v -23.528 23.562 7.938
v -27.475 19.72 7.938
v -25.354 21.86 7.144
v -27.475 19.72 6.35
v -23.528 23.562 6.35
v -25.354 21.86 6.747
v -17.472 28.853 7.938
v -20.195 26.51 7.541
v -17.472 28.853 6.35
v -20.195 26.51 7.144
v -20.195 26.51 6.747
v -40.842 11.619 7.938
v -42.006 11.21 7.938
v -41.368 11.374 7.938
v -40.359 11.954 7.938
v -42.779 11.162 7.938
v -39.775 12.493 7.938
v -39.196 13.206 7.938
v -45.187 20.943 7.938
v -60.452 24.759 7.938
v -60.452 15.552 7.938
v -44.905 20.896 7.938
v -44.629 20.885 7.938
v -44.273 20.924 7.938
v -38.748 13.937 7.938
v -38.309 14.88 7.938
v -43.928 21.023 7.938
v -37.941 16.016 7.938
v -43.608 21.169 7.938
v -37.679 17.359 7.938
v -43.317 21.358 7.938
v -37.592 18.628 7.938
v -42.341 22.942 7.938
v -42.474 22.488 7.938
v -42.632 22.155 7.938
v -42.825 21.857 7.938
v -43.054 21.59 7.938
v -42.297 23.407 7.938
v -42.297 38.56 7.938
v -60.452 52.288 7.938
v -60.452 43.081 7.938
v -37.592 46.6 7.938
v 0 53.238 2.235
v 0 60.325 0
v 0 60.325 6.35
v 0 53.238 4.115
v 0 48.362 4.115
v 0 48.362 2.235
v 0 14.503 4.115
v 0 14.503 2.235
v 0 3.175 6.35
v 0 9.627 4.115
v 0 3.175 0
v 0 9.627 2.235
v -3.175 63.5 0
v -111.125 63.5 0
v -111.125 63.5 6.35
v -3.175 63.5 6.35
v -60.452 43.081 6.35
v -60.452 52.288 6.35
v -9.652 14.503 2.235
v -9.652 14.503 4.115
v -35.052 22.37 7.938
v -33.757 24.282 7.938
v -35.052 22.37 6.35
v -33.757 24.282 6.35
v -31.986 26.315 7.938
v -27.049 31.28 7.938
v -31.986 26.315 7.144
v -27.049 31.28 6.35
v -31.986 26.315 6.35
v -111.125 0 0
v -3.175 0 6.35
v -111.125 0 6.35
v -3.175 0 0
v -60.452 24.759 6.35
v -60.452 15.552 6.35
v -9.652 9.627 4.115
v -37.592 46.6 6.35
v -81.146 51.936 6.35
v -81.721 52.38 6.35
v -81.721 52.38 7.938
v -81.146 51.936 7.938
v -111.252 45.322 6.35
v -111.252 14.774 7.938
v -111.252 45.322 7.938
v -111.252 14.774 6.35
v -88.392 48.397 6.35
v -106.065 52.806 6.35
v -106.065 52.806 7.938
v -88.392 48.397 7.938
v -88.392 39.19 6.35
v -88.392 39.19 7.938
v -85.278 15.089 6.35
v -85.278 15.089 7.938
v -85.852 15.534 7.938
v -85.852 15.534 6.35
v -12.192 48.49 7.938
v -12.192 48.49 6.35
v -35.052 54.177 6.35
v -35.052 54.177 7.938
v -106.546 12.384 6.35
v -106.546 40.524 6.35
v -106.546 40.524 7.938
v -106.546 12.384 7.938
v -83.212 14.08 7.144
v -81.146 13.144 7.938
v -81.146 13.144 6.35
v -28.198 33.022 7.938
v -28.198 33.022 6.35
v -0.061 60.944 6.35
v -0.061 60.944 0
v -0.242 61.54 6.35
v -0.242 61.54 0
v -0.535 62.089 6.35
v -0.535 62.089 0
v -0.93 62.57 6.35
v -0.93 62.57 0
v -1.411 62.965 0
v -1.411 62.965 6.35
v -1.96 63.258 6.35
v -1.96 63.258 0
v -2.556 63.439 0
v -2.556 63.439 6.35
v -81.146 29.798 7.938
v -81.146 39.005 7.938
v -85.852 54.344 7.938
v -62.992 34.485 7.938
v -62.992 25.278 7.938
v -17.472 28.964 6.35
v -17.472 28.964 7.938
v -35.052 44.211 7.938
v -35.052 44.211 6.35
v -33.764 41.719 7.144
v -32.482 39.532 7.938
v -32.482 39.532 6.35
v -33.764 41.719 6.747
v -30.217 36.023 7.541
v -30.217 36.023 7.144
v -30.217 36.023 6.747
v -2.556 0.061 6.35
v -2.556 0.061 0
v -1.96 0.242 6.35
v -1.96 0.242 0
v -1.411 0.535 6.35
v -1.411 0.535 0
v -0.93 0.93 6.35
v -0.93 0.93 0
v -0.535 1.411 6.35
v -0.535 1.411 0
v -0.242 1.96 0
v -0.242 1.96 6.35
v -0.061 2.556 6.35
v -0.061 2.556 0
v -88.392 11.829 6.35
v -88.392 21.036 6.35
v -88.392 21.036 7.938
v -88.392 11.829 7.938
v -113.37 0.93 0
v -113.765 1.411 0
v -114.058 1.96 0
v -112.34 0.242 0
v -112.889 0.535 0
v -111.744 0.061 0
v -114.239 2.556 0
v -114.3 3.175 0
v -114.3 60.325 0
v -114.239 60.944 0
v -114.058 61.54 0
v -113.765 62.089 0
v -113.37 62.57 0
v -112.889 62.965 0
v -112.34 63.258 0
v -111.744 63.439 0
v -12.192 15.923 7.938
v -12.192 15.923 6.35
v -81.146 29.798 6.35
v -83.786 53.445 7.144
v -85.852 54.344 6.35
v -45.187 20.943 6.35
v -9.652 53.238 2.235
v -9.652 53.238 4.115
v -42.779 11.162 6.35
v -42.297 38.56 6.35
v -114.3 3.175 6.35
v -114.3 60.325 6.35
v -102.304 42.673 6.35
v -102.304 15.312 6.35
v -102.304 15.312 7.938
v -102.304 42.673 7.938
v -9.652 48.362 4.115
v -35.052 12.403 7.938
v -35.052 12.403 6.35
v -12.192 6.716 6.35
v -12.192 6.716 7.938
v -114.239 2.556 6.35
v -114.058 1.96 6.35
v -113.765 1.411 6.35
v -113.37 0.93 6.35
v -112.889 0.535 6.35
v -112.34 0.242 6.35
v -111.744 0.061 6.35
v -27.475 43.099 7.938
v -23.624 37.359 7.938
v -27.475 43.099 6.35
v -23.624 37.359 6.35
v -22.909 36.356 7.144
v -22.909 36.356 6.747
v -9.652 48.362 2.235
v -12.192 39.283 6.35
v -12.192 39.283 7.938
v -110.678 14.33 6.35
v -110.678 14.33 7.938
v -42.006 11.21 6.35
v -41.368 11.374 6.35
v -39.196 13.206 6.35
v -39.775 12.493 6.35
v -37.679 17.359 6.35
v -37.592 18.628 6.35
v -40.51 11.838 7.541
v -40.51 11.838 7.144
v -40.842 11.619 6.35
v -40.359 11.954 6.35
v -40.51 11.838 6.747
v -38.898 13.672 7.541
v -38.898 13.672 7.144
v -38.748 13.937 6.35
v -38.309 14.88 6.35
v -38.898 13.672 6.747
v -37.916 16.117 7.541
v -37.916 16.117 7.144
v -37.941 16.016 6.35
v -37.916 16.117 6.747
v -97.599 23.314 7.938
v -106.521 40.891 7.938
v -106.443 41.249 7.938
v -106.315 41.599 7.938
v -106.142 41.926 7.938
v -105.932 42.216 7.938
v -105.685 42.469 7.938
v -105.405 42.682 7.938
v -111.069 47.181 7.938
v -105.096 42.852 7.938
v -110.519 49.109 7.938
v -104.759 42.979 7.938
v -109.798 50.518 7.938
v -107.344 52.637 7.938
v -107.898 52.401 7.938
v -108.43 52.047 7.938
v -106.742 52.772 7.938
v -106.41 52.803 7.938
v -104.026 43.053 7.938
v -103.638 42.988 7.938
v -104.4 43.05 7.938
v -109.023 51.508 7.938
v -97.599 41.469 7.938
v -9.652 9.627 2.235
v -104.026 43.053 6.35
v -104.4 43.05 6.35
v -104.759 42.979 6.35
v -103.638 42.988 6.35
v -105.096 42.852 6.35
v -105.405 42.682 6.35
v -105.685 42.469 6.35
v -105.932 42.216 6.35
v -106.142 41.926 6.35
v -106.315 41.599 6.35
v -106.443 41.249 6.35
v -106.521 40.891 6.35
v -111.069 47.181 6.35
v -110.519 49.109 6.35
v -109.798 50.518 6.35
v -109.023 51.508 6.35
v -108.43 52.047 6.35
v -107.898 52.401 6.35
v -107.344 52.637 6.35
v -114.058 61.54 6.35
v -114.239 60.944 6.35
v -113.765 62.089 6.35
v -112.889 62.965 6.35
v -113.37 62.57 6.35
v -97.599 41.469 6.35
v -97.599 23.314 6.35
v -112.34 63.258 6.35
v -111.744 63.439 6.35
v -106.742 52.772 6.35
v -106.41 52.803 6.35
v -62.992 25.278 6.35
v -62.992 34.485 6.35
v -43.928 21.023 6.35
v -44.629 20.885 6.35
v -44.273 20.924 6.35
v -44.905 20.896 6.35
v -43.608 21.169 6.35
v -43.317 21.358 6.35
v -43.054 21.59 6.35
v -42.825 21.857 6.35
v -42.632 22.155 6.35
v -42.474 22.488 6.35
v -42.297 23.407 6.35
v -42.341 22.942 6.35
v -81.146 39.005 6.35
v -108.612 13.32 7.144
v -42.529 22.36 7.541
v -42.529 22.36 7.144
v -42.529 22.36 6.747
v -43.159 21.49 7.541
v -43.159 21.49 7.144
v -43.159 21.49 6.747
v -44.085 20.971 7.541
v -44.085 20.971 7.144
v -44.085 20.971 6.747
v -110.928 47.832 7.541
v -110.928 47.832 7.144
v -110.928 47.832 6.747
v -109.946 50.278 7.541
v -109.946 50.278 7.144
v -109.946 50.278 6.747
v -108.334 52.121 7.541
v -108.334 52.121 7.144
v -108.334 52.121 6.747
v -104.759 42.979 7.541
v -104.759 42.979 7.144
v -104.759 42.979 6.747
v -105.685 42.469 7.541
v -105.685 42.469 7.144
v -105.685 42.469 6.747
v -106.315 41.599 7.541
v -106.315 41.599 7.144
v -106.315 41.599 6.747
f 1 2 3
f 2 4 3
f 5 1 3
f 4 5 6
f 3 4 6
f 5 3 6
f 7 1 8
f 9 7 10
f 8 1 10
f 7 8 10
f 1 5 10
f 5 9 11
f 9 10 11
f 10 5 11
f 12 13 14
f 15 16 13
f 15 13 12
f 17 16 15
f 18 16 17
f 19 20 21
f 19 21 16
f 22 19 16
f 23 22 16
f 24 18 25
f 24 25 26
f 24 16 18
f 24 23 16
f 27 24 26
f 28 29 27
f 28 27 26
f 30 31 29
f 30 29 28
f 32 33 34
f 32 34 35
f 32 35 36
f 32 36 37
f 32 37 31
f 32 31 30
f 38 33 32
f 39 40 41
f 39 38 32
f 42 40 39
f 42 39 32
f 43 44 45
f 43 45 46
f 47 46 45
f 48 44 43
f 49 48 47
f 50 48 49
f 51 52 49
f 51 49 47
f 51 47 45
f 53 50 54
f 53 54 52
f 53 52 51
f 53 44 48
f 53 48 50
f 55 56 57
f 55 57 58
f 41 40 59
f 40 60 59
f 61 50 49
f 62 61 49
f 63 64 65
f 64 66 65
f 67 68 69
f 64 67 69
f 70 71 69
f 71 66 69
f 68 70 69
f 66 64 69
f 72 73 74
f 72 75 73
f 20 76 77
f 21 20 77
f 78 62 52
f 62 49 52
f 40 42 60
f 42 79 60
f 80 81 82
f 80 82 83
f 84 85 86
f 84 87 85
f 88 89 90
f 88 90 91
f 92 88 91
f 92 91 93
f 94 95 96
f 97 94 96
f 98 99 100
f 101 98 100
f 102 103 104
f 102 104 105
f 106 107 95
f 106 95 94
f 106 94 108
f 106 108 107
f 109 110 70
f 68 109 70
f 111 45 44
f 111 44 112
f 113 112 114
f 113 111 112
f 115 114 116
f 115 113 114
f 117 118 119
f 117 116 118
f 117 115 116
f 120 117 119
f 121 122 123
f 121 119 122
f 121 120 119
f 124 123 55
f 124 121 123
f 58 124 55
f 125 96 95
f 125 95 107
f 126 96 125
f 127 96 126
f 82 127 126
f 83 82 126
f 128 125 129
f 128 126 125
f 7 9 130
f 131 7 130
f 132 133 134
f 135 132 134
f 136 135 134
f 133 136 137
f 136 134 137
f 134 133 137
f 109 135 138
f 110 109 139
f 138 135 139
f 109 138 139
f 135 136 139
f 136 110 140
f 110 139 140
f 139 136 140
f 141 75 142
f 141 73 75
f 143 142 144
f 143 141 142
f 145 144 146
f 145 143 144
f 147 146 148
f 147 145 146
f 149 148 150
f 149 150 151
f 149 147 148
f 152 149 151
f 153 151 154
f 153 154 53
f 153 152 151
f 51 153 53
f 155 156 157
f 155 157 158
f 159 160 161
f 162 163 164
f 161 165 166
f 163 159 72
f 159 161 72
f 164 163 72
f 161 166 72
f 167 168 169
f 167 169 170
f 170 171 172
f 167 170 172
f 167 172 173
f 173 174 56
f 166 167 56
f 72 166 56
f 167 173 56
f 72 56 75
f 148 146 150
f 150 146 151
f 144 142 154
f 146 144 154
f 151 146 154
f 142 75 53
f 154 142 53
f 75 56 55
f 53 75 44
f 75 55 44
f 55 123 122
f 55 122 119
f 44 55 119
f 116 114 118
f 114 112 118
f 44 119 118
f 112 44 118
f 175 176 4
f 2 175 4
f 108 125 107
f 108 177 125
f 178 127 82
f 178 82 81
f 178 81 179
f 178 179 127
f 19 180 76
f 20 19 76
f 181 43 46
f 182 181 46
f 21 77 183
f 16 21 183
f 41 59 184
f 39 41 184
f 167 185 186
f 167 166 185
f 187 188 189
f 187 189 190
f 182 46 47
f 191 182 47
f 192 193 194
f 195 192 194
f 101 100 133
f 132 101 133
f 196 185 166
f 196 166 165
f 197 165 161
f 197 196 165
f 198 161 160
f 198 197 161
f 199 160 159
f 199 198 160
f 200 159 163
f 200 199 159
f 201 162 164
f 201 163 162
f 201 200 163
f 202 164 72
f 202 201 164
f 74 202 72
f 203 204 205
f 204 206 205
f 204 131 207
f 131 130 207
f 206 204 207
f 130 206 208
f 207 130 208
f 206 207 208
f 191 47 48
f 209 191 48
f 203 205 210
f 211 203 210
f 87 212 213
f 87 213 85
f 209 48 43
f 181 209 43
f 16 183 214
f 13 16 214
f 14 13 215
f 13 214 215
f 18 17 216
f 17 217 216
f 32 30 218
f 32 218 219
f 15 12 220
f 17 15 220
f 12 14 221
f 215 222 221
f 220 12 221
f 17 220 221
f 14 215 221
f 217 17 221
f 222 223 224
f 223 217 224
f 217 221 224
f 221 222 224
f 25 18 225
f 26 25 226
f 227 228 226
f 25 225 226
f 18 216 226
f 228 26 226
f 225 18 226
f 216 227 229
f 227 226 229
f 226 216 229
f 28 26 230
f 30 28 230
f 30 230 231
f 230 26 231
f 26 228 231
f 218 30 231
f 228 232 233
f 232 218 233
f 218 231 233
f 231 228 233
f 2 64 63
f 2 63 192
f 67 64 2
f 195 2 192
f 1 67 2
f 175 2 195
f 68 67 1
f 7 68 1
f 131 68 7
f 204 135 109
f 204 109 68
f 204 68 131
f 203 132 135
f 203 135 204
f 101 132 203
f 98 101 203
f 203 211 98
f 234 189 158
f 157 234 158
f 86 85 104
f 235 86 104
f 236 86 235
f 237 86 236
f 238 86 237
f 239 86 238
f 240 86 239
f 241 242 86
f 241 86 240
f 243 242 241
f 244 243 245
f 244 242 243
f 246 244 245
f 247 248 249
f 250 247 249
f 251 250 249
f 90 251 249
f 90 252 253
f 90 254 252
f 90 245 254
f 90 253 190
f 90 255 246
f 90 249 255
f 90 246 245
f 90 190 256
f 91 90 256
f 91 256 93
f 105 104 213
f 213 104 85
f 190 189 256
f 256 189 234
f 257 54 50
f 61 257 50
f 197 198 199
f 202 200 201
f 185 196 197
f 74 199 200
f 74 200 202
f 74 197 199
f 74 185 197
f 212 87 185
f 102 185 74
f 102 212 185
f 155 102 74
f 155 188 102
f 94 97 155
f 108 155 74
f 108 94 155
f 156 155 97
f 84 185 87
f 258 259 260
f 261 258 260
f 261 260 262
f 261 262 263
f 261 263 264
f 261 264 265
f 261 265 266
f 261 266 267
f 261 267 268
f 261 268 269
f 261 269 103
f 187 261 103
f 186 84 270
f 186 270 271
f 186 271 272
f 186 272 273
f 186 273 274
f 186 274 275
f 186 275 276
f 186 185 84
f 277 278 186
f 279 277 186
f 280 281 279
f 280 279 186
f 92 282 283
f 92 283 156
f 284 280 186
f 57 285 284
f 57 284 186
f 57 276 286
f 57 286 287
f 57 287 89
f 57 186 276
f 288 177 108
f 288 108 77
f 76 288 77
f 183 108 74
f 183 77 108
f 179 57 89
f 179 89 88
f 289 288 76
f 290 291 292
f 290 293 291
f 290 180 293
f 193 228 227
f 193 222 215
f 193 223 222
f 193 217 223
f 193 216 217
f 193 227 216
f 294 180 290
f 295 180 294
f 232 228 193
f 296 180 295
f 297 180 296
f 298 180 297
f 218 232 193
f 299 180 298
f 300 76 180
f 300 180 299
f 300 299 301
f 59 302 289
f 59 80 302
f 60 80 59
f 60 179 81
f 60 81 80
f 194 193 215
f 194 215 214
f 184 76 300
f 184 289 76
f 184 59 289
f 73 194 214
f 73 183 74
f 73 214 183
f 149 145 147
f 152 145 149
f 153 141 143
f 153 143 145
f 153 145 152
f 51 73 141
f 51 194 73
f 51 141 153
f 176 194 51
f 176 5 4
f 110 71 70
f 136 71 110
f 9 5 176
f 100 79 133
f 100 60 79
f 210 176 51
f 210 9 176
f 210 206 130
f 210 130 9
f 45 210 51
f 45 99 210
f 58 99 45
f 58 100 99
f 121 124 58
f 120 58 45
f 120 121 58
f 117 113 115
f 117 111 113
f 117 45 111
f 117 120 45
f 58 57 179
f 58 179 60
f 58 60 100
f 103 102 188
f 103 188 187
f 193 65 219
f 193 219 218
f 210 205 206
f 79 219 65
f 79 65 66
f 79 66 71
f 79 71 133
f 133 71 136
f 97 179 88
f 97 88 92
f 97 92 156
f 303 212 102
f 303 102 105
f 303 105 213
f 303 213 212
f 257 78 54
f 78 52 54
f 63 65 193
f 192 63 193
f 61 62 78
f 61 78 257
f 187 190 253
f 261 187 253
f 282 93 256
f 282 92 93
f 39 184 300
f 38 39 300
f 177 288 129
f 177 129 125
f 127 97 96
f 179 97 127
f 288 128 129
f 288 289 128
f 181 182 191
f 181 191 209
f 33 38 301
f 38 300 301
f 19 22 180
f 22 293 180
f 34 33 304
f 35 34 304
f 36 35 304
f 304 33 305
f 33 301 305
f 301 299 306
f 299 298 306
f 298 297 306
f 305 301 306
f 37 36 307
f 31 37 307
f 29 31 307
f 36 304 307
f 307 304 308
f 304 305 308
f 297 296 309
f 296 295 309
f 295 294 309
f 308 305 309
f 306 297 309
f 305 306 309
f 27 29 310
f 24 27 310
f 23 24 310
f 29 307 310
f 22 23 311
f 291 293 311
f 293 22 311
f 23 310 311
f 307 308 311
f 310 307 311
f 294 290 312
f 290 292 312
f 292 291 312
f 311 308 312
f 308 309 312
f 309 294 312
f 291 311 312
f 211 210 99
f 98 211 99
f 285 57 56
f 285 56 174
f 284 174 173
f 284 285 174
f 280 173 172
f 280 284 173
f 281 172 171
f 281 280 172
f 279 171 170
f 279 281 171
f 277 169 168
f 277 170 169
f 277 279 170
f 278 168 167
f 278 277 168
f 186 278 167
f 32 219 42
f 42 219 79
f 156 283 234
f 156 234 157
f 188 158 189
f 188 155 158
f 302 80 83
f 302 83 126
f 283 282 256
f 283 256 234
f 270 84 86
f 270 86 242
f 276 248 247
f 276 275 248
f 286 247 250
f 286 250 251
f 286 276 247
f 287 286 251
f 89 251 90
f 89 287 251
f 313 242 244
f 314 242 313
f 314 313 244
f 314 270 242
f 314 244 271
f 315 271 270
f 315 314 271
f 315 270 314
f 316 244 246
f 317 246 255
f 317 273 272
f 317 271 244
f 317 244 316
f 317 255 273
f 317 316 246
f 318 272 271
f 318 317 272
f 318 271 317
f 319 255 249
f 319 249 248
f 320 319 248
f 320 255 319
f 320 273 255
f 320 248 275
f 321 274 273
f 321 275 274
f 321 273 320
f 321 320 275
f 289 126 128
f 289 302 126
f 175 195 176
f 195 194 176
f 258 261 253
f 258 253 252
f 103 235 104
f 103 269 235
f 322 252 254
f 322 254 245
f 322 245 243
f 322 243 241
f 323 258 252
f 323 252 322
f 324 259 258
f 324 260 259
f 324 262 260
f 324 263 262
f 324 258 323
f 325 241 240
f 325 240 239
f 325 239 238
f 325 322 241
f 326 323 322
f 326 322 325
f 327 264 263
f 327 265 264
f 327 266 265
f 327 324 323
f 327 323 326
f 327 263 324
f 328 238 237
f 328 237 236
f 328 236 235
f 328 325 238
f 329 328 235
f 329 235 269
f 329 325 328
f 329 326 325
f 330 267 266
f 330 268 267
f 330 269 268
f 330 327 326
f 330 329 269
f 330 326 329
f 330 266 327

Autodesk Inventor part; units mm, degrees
ref_plane "YZ Plane" through (0, 0, 0) normal (1, 0, 0) x (0, 1, 0)
ref_plane "XZ Plane" through (0, 0, 0) normal (0, 1, 0) x (-1, 0, 0)
sketch "Sketch1" plane through (0, 0, 0) normal (0, 0, 1) x (1, 0, 0)
  line L0 (0, 0) -> (-114.3, 0)
  line L1 (-114.3, 0) -> (-114.3, 63.5)
  line L2 (-114.3, 63.5) -> (0, 63.5)
  line L3 (0, 63.5) -> (0, 0)
  dimension "d7" = 114.3
  dimension "d8" = 63.5
extrude "Extrusion1" add sketch "Sketch1" along normal blind 6.35
sketch "Sketch2" plane through (0, 0, 6.35) normal (0, 0, 1) x (1, 0, 0)
  line L0 (0, 0) -> (0, 63.5) projected
  line L1 (-114.3, 63.5) -> (-114.3, 0) projected
  line L2 (-114.3, 0) -> (0, 0) projected
  line L3 (0, 63.5) -> (-114.3, 63.5) projected
sketch "Sketch3" plane through (0, 0, 6.35) normal (0, 0, 1) x (1, 0, 0)
  line L0 (-110.6716, 35.2666) -> (-52.0005, 35.2666) construction
  line L1 (-52.0005, 35.2666) -> (-52.0005, 28.3217) construction
  line L2 (-52.0005, 28.3217) -> (-110.6716, 28.3217) construction
  line L3 (-110.6716, 28.3217) -> (-110.6716, 35.2666) construction
  line L4 (-114.3, 63.5) -> (-114.3, 0) projected
  point P0 (0, 0)
extrude "Extrusion2" [suppressed]
fillet "Fillet2" radius 3.175 4 edges at (-114.3, 63.5, 3.175) (-114.3, 0, 3.175) (0, 0, 3.175) (0, 63.5, 3.175)
sketch "Sketch4" plane through (0, 0, 6.35) normal (0, 0, 1) x (1, 0, 0)
  point P0 (0, 0)
sketch "Sketch5" plane through (0, 0, 6.35) normal (0, 0, 1) x (1, 0, 0)
  point P0 (0, 0)
sketch "Sketch6" plane through (0, 0, 6.35) normal (0, 0, 1) x (1, 0, 0)
  point P0 (0, 0)
ref_plane "Work Plane1" through (-57.15, 3.175, 0) normal (1, 0, 0) x (0, 0, -1)
sketch "Sketch7" plane through (-111.125, 63.5, 0) normal (0, 1, 0) x (1, 0, 0)
  line L0 (107.95, -6.35) -> (0, -6.35) projected
  line L1 (107.95, 0) -> (0, 0) projected
  line L2 (0, -6.35) -> (0, -3.175)
  line L3 (0, -6.35) -> (0, 0) projected
  line L4 (0, 0) -> (0, -6.35) projected
  line L5 (0, -6.35) -> (0, -3.5306)
  line L6 (0, -3.5306) -> (6.985, -3.5306)
  line L7 (6.985, -3.5306) -> (11.8618, -3.5306)
  line L8 (11.8618, -3.5306) -> (11.8618, -1.651)
  line L9 (11.8618, -1.651) -> (6.985, -1.651)
  line L10 (6.985, -1.651) -> (6.985, -3.5306)
  point P0 (111.125, 0)
  dimension "d24" = 4.8768
  dimension "d25" = 1.8796
  dimension "d26" = 2.8194
  dimension "d27" = 6.985
extrude "Extrusion3" [suppressed]
sketch "Sketch8" plane through (-111.125, 0, 0) normal (0, -1, 0) x (1, 0, 0)
  line L0 (0, 0) -> (0, 6.35) projected
  line L1 (6.985, 3.5306) -> (6.985, 1.651) projected
  line L2 (11.8618, 1.651) -> (11.8618, 3.5306) projected
  line L3 (6.985, 1.651) -> (11.8618, 1.651)
  line L4 (11.8618, 1.651) -> (11.8618, 3.5306)
  line L5 (11.8618, 3.5306) -> (6.985, 3.5306)
  line L6 (6.985, 3.5306) -> (6.985, 1.651)
  line L7 (0, 0) -> (107.95, 0) projected
  point P0 (111.125, 0)
extrude "Extrusion4" [suppressed]
mirror "Mirror1" [suppressed]
mirror "Mirror2" [suppressed]
sketch "Sketch9" plane through (0, 0, 6.35) normal (0, 0, 1) x (1, 0, 0)
  point P0 (0, 0)
sketch "Sketch10" plane through (0, 0, 6.35) normal (0, 0, 1) x (1, 0, 0)
  line L0 (-111.2518, 27.0157) -> (-111.2518, 30.2464) construction
  line L1 (-111.2518, 30.2464) -> (-93.1484, 30.2464) construction
  line L2 (-93.1484, 30.2464) -> (-93.1484, 27.0157) construction
  line L3 (-93.1484, 27.0157) -> (-111.2518, 27.0157) construction
  line L4 (-114.3, 60.325) -> (-114.3, 3.175) projected
  line L5 (-114.3, 60.325) -> (-114.3, 3.175)
  line L6 (-114.3, 3.175) -> (-114.3, 31.75)
  line L7 (0, 3.175) -> (0, 60.325) projected
  line L8 (-88.3918, 11.8288) -> (-102.3042, 15.3115)
  line L9 (-102.3042, 15.3115) -> (-102.3042, 42.6731)
  line L10 (-102.3042, 42.6731) -> (-103.638, 42.988)
  spline S0 degree 2 poles (-103.638, 42.988) (-104.2308, 43.1362) (-105.2867, 42.8213) (-106.0833, 42.1173) (-106.5464, 41.0799) (-106.5464, 40.5242) knots 0 0 0 1 2 3 4 4 4
  line L11 (-106.5464, 40.5242) -> (-106.5464, 12.3845)
  spline S1 degree 2 poles (-106.5464, 12.3845) (-107.4912, 12.8106) (-109.7327, 13.8295) (-110.6775, 14.3297) knots 0 0 0 1 2 2 2
  line L12 (-110.6775, 14.3297) -> (-111.2518, 14.7743)
  line L13 (-111.2518, 14.7743) -> (-111.2518, 45.3222)
  spline S2 degree 2 poles (-111.2518, 45.3222) (-111.2518, 46.5078) (-110.6034, 49.1569) (-109.2881, 51.3984) (-107.38, 52.8434) (-106.0648, 52.8063) knots 0 0 0 1 2 3 4 4 4
  line L14 (-106.0648, 52.8063) -> (-88.3918, 48.3974)
  line L15 (-88.3918, 48.3974) -> (-88.3918, 39.1904)
  line L16 (-88.3918, 39.1904) -> (-97.5988, 41.469)
  line L17 (-97.5988, 41.469) -> (-97.5988, 23.3143)
  line L18 (-97.5988, 23.3143) -> (-88.3918, 21.0358)
  line L19 (-88.3918, 21.0358) -> (-88.3918, 11.8288)
  spline S3 degree 2 poles (-81.1464, 13.144) (-82.0912, 13.5701) (-84.3327, 14.589) (-85.2775, 15.0892) knots 0 0 0 1 2 2 2
  line L20 (-85.2775, 15.0892) -> (-85.8518, 15.5338)
  line L21 (-85.8518, 15.5338) -> (-85.8518, 54.3439)
  spline S4 degree 2 poles (-85.8518, 54.3439) (-84.907, 53.9734) (-82.6655, 52.9175) (-81.7207, 52.3803) knots 0 0 0 1 2 2 2
  line L22 (-81.7207, 52.3803) -> (-81.1464, 51.9357)
  line L23 (-81.1464, 51.9357) -> (-81.1464, 39.0051)
  line L24 (-81.1464, 39.0051) -> (-62.9918, 34.485)
  line L25 (-62.9918, 34.485) -> (-62.9918, 25.278)
  line L26 (-62.9918, 25.278) -> (-81.1464, 29.7981)
  line L27 (-81.1464, 29.7981) -> (-81.1464, 13.144)
  spline S5 degree 2 poles (-42.7788, 11.1619) (-41.4635, 11.1248) (-39.5555, 12.5512) (-38.2402, 14.7928) (-37.5918, 17.4419) (-37.5918, 18.6275) knots 0 0 0 1 2 3 4 4 4
  line L28 (-37.5918, 18.6275) -> (-37.5918, 46.6004)
  line L29 (-37.5918, 46.6004) -> (-60.4518, 52.2876)
  line L30 (-60.4518, 52.2876) -> (-60.4518, 43.0806)
  line L31 (-60.4518, 43.0806) -> (-42.2972, 38.5605)
  line L32 (-42.2972, 38.5605) -> (-42.2972, 23.407)
  spline S6 degree 2 poles (-42.2972, 23.407) (-42.2972, 22.8697) (-42.7603, 21.8509) (-43.5569, 21.1284) (-44.6128, 20.8134) (-45.1871, 20.9431) knots 0 0 0 1 2 3 4 4 4
  line L33 (-45.1871, 20.9431) -> (-60.4518, 24.7593)
  line L34 (-60.4518, 24.7593) -> (-60.4518, 15.5523)
  line L35 (-60.4518, 15.5523) -> (-42.7788, 11.1619)
  line L36 (-35.0518, 12.403) -> (-12.1918, 6.7158)
  line L37 (-12.1918, 6.7158) -> (-12.1918, 15.9228)
  line L38 (-12.1918, 15.9228) -> (-27.475, 19.7205)
  spline S7 degree 2 poles (-27.475, 19.7205) (-26.5302, 20.7393) (-24.1775, 22.9809) (-21.5655, 25.3336) (-18.8238, 27.6863) (-17.4715, 28.8534) knots 0 0 0 1 2 3 4 4 4
  line L39 (-17.4715, 28.8534) -> (-17.4715, 28.9645)
  spline S8 degree 2 poles (-17.4715, 28.9645) (-18.8238, 30.78) (-21.6026, 34.5406) (-24.2146, 38.1715) (-26.5302, 41.5986) (-27.475, 43.0992) knots 0 0 0 1 2 3 4 4 4
  line L40 (-27.475, 43.0992) -> (-12.1918, 39.283)
  line L41 (-12.1918, 39.283) -> (-12.1918, 48.49)
  line L42 (-12.1918, 48.49) -> (-35.0518, 54.1772)
  line L43 (-35.0518, 54.1772) -> (-35.0518, 44.2107)
  spline S9 degree 2 poles (-35.0518, 44.2107) (-34.5146, 43.0621) (-33.014, 40.376) (-31.2171, 37.5046) (-29.2164, 34.5406) (-28.1975, 33.0215) knots 0 0 0 1 2 3 4 4 4
  line L44 (-28.1975, 33.0215) -> (-27.0489, 31.2801)
  spline S10 degree 2 poles (-27.0489, 31.2801) (-29.9759, 28.4087) (-33.9959, 24.2221) (-35.0518, 22.3696) knots 0 0 0 1 2 2 2
  line L45 (-35.0518, 22.3696) -> (-35.0518, 12.403)
  point P0 (0, 0)
sketch "Sketch11" plane through (0, 3.175, 0) normal (1, 0, 0) x (0, 0, -1)
  line L0 (0, 0) -> (-6.35, 0) projected
  line L1 (-3.175, 0) -> (-3.175, 8.89)
  line L2 (-4.1148, 6.4516) -> (-2.2352, 6.4516)
  line L3 (-2.2352, 6.4516) -> (-2.2352, 11.3284)
  line L4 (-2.2352, 11.3284) -> (-4.1148, 11.3284)
  line L5 (-4.1148, 11.3284) -> (-4.1148, 6.4516)
  line L6 (-4.1148, 6.4516) -> (-2.2352, 11.3284) construction
  line L7 (-2.2352, 6.4516) -> (-4.1148, 11.3284) construction
  line L8 (0, 60.325) -> (-6.35, 60.325) projected
  line L9 (-3.175, 60.325) -> (-3.175, 47.625)
  line L10 (-4.1148, 45.1866) -> (-2.2352, 45.1866)
  line L11 (-2.2352, 45.1866) -> (-2.2352, 50.0634)
  line L12 (-2.2352, 50.0634) -> (-4.1148, 50.0634)
  line L13 (-4.1148, 50.0634) -> (-4.1148, 45.1866)
  line L14 (-4.1148, 45.1866) -> (-2.2352, 50.0634) construction
  line L15 (-2.2352, 45.1866) -> (-4.1148, 50.0634) construction
  point P0 (0, -3.175)
  point P1 (-2.2352, 47.625)
  dimension "d29" = 8.89
  dimension "d30" = 12.7
  dimension "d31" = 4.8768
  dimension "d32" = 1.8796
  dimension "d33" = 4.8768
  dimension "d34" = 1.8796
extrude "Extrusion5" cut sketch "Sketch11" against normal blind 9.652
extrude "Extrusion6" add sketch "Sketch10" along normal blind 1.5875
properties part number "custom  plate vertical"
